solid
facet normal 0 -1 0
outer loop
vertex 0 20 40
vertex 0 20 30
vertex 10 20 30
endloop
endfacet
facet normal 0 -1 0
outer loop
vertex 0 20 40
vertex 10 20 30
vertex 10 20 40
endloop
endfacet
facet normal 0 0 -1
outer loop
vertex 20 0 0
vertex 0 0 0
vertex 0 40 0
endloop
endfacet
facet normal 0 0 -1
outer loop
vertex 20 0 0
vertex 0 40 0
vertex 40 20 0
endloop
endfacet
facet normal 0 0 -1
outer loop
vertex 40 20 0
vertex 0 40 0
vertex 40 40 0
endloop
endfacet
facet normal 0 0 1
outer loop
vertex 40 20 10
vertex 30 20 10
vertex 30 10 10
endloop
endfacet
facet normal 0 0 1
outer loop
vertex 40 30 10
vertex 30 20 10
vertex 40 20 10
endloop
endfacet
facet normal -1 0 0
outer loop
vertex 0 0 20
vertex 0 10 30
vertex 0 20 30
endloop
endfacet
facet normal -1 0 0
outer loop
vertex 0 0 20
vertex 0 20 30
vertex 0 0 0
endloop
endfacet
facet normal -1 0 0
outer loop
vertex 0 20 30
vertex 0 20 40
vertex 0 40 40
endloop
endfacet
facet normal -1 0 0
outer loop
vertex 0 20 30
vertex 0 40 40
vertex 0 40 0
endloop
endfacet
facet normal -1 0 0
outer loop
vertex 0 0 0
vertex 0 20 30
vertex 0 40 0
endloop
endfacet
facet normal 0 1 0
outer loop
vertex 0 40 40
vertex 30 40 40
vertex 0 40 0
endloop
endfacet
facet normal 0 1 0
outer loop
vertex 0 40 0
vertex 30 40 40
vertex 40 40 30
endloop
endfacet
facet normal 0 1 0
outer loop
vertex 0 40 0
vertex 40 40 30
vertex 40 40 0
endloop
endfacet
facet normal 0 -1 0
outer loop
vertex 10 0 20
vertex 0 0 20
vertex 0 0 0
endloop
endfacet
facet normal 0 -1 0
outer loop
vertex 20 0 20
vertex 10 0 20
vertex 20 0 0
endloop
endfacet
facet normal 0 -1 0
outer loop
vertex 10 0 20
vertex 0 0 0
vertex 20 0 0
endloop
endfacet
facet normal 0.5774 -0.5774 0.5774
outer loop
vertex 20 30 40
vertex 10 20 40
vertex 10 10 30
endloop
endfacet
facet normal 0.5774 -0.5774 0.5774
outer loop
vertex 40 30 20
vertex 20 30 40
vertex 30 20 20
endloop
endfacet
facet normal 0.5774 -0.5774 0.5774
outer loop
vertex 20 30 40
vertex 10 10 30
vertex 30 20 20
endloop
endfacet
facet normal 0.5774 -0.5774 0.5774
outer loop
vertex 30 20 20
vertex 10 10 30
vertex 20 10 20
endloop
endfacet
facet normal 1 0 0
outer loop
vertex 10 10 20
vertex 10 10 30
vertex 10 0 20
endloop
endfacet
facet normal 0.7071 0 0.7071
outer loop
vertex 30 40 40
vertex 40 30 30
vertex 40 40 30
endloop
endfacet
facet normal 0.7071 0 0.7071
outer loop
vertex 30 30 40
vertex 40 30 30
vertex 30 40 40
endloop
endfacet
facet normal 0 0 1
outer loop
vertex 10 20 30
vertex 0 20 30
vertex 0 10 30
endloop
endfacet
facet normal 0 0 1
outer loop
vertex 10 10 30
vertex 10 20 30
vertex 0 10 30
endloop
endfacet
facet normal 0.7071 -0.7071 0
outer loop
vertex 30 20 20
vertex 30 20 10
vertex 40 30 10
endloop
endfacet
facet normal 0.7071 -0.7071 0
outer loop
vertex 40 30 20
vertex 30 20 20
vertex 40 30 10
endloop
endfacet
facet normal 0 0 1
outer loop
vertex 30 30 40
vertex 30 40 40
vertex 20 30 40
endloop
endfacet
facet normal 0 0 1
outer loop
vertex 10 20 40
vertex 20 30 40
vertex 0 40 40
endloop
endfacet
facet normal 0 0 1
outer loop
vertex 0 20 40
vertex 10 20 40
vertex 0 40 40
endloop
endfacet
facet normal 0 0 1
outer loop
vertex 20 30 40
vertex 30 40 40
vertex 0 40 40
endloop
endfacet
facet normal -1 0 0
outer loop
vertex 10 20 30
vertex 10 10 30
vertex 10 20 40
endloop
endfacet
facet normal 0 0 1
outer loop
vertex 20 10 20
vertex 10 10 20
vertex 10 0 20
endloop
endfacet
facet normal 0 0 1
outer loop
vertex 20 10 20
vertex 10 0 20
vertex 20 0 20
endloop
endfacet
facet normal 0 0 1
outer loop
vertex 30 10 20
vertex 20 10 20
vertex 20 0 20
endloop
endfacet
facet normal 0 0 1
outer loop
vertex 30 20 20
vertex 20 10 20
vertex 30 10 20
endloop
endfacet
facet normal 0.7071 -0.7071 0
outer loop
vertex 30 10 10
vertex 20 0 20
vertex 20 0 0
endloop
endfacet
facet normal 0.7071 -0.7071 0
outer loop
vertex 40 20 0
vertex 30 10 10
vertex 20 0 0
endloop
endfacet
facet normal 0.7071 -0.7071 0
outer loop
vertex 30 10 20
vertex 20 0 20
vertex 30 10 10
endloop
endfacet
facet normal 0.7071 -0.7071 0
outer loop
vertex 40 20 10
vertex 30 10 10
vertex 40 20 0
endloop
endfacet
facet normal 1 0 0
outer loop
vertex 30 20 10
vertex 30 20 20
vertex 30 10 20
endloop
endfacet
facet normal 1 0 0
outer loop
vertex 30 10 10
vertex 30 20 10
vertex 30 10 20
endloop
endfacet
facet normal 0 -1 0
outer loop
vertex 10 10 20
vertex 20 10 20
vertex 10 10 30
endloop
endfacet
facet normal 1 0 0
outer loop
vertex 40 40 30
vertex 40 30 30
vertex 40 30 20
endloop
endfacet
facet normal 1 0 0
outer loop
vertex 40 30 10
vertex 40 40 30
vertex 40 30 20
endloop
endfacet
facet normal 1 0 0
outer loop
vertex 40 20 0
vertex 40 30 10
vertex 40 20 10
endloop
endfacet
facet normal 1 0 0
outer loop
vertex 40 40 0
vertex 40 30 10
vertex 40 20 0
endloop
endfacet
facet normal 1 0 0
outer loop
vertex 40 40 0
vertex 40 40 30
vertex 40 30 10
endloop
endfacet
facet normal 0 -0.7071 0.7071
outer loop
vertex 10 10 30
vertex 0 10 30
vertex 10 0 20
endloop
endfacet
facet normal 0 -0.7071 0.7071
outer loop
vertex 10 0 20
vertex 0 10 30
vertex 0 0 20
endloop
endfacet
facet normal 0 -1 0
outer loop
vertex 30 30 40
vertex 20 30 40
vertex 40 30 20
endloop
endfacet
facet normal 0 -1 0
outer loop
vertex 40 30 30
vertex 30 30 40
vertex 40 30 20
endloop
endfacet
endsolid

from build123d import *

# Parameters (mm, degrees)
SKETCH1_W           = 40
SKETCH1_H           = 40
BOSS_EXTRUDE1_DEPTH = 20
CUT_EXTRUDE1_DEPTH  = 20
CUT_EXTRUDE2_DEPTH  = 10
SKETCH4_W           = 20
SKETCH4_H           = 10
BOSS_EXTRUDE2_DEPTH = 40
CUT_EXTRUDE3_DEPTH  = 40
SKETCH6_W           = 20
SKETCH6_H           = 10
BOSS_EXTRUDE3_DEPTH = 10
BOSS_EXTRUDE4_DEPTH = 10
BOSS_EXTRUDE5_DEPTH = 27
BOSS_EXTRUDE6_DEPTH = 20
CUT_EXTRUDE4_DEPTH  = 20


with BuildPart() as part:
    # Sketch1 → Boss-Extrude1 (new body)
    with BuildSketch(Plane.XY):
        with Locations((20, 20)):
            Rectangle(SKETCH1_W, SKETCH1_H)
    extrude(amount=BOSS_EXTRUDE1_DEPTH)

    # Sketch2 → Cut-Extrude1 (cut)
    with BuildSketch(Plane.XY.offset(20)):
        Polygon((20, 0), (40, 20), (40, 0), align=None)
    extrude(amount=-CUT_EXTRUDE1_DEPTH, mode=Mode.SUBTRACT)

    # Sketch3 → Cut-Extrude2 (cut)
    with BuildSketch(Plane.XY.offset(20)):
        Polygon((30, 20), (30, 10), (40, 20), (40, 30), align=None)
    extrude(amount=-CUT_EXTRUDE2_DEPTH, mode=Mode.SUBTRACT)

    # Sketch4 → Boss-Extrude2 (add)
    with BuildSketch(Plane(origin=(40, 0, 0), x_dir=(0, 0, -1), z_dir=(1, 0, 0))):
        with Locations((-30, 35)):
            Rectangle(SKETCH4_W, SKETCH4_H)
    extrude(amount=-BOSS_EXTRUDE2_DEPTH)

    # Sketch5 → Cut-Extrude3 (cut)
    with BuildSketch(Plane(origin=(0, 30, 0), x_dir=(-1, 0, 0), z_dir=(0, -1, 0))):
        Polygon((-30, -40), (-40, -40), (-40, -30), align=None)
    extrude(amount=-CUT_EXTRUDE3_DEPTH, mode=Mode.SUBTRACT)

    # Sketch6 → Boss-Extrude3 (add)
    with BuildSketch(Plane.ZY):
        with Locations((30, 25)):
            Rectangle(SKETCH6_W, SKETCH6_H)
    extrude(amount=-BOSS_EXTRUDE3_DEPTH)

    # Sketch7 → Boss-Extrude4 (add)
    with BuildSketch(Plane.ZY):
        Polygon((30, 20), (30, 10), (20, 0), (20, 20), align=None)
    extrude(amount=-BOSS_EXTRUDE4_DEPTH)

    # Sketch8 → Boss-Extrude5 (add)
    with BuildSketch(Plane.XY.offset(40)):
        Polygon((10, 20), (20, 30), (10, 30), align=None)
    extrude(amount=-BOSS_EXTRUDE5_DEPTH)

    # Sketch9 → Boss-Extrude6 (add)
    with BuildSketch(Plane.XY.offset(20)):
        Polygon((10, 20), (20, 30), (40, 30), (30, 20), (20, 10), (10, 10), align=None)
    extrude(amount=BOSS_EXTRUDE6_DEPTH)

    # 3DSketch1 → Cut-Extrude4 (cut, along a direction that is not the sketch's normal)
    with BuildSketch(Plane(origin=(20, 30, 40), x_dir=(0.7071067811865471, 0, -0.7071067811865479), z_dir=(-0.5773502691896258, 0.5773502691896264, -0.5773502691896252))):
        Polygon((0, 0), (28.284271247, 0), (14.142135624, 24.494897428), (0, 24.494897428), (-7.071067812, 12.247448714), align=None)
    extrude(amount=-CUT_EXTRUDE4_DEPTH, dir=(-1, 0, 0), mode=Mode.SUBTRACT)


with BuildPart() as body_2:
    # of the pieces the cut leaves, the one that is kept (cut_extrude4_keep)
    add(part.part.solids().sort_by_distance((0, 0, 0))[0])


solid = body_2.part
